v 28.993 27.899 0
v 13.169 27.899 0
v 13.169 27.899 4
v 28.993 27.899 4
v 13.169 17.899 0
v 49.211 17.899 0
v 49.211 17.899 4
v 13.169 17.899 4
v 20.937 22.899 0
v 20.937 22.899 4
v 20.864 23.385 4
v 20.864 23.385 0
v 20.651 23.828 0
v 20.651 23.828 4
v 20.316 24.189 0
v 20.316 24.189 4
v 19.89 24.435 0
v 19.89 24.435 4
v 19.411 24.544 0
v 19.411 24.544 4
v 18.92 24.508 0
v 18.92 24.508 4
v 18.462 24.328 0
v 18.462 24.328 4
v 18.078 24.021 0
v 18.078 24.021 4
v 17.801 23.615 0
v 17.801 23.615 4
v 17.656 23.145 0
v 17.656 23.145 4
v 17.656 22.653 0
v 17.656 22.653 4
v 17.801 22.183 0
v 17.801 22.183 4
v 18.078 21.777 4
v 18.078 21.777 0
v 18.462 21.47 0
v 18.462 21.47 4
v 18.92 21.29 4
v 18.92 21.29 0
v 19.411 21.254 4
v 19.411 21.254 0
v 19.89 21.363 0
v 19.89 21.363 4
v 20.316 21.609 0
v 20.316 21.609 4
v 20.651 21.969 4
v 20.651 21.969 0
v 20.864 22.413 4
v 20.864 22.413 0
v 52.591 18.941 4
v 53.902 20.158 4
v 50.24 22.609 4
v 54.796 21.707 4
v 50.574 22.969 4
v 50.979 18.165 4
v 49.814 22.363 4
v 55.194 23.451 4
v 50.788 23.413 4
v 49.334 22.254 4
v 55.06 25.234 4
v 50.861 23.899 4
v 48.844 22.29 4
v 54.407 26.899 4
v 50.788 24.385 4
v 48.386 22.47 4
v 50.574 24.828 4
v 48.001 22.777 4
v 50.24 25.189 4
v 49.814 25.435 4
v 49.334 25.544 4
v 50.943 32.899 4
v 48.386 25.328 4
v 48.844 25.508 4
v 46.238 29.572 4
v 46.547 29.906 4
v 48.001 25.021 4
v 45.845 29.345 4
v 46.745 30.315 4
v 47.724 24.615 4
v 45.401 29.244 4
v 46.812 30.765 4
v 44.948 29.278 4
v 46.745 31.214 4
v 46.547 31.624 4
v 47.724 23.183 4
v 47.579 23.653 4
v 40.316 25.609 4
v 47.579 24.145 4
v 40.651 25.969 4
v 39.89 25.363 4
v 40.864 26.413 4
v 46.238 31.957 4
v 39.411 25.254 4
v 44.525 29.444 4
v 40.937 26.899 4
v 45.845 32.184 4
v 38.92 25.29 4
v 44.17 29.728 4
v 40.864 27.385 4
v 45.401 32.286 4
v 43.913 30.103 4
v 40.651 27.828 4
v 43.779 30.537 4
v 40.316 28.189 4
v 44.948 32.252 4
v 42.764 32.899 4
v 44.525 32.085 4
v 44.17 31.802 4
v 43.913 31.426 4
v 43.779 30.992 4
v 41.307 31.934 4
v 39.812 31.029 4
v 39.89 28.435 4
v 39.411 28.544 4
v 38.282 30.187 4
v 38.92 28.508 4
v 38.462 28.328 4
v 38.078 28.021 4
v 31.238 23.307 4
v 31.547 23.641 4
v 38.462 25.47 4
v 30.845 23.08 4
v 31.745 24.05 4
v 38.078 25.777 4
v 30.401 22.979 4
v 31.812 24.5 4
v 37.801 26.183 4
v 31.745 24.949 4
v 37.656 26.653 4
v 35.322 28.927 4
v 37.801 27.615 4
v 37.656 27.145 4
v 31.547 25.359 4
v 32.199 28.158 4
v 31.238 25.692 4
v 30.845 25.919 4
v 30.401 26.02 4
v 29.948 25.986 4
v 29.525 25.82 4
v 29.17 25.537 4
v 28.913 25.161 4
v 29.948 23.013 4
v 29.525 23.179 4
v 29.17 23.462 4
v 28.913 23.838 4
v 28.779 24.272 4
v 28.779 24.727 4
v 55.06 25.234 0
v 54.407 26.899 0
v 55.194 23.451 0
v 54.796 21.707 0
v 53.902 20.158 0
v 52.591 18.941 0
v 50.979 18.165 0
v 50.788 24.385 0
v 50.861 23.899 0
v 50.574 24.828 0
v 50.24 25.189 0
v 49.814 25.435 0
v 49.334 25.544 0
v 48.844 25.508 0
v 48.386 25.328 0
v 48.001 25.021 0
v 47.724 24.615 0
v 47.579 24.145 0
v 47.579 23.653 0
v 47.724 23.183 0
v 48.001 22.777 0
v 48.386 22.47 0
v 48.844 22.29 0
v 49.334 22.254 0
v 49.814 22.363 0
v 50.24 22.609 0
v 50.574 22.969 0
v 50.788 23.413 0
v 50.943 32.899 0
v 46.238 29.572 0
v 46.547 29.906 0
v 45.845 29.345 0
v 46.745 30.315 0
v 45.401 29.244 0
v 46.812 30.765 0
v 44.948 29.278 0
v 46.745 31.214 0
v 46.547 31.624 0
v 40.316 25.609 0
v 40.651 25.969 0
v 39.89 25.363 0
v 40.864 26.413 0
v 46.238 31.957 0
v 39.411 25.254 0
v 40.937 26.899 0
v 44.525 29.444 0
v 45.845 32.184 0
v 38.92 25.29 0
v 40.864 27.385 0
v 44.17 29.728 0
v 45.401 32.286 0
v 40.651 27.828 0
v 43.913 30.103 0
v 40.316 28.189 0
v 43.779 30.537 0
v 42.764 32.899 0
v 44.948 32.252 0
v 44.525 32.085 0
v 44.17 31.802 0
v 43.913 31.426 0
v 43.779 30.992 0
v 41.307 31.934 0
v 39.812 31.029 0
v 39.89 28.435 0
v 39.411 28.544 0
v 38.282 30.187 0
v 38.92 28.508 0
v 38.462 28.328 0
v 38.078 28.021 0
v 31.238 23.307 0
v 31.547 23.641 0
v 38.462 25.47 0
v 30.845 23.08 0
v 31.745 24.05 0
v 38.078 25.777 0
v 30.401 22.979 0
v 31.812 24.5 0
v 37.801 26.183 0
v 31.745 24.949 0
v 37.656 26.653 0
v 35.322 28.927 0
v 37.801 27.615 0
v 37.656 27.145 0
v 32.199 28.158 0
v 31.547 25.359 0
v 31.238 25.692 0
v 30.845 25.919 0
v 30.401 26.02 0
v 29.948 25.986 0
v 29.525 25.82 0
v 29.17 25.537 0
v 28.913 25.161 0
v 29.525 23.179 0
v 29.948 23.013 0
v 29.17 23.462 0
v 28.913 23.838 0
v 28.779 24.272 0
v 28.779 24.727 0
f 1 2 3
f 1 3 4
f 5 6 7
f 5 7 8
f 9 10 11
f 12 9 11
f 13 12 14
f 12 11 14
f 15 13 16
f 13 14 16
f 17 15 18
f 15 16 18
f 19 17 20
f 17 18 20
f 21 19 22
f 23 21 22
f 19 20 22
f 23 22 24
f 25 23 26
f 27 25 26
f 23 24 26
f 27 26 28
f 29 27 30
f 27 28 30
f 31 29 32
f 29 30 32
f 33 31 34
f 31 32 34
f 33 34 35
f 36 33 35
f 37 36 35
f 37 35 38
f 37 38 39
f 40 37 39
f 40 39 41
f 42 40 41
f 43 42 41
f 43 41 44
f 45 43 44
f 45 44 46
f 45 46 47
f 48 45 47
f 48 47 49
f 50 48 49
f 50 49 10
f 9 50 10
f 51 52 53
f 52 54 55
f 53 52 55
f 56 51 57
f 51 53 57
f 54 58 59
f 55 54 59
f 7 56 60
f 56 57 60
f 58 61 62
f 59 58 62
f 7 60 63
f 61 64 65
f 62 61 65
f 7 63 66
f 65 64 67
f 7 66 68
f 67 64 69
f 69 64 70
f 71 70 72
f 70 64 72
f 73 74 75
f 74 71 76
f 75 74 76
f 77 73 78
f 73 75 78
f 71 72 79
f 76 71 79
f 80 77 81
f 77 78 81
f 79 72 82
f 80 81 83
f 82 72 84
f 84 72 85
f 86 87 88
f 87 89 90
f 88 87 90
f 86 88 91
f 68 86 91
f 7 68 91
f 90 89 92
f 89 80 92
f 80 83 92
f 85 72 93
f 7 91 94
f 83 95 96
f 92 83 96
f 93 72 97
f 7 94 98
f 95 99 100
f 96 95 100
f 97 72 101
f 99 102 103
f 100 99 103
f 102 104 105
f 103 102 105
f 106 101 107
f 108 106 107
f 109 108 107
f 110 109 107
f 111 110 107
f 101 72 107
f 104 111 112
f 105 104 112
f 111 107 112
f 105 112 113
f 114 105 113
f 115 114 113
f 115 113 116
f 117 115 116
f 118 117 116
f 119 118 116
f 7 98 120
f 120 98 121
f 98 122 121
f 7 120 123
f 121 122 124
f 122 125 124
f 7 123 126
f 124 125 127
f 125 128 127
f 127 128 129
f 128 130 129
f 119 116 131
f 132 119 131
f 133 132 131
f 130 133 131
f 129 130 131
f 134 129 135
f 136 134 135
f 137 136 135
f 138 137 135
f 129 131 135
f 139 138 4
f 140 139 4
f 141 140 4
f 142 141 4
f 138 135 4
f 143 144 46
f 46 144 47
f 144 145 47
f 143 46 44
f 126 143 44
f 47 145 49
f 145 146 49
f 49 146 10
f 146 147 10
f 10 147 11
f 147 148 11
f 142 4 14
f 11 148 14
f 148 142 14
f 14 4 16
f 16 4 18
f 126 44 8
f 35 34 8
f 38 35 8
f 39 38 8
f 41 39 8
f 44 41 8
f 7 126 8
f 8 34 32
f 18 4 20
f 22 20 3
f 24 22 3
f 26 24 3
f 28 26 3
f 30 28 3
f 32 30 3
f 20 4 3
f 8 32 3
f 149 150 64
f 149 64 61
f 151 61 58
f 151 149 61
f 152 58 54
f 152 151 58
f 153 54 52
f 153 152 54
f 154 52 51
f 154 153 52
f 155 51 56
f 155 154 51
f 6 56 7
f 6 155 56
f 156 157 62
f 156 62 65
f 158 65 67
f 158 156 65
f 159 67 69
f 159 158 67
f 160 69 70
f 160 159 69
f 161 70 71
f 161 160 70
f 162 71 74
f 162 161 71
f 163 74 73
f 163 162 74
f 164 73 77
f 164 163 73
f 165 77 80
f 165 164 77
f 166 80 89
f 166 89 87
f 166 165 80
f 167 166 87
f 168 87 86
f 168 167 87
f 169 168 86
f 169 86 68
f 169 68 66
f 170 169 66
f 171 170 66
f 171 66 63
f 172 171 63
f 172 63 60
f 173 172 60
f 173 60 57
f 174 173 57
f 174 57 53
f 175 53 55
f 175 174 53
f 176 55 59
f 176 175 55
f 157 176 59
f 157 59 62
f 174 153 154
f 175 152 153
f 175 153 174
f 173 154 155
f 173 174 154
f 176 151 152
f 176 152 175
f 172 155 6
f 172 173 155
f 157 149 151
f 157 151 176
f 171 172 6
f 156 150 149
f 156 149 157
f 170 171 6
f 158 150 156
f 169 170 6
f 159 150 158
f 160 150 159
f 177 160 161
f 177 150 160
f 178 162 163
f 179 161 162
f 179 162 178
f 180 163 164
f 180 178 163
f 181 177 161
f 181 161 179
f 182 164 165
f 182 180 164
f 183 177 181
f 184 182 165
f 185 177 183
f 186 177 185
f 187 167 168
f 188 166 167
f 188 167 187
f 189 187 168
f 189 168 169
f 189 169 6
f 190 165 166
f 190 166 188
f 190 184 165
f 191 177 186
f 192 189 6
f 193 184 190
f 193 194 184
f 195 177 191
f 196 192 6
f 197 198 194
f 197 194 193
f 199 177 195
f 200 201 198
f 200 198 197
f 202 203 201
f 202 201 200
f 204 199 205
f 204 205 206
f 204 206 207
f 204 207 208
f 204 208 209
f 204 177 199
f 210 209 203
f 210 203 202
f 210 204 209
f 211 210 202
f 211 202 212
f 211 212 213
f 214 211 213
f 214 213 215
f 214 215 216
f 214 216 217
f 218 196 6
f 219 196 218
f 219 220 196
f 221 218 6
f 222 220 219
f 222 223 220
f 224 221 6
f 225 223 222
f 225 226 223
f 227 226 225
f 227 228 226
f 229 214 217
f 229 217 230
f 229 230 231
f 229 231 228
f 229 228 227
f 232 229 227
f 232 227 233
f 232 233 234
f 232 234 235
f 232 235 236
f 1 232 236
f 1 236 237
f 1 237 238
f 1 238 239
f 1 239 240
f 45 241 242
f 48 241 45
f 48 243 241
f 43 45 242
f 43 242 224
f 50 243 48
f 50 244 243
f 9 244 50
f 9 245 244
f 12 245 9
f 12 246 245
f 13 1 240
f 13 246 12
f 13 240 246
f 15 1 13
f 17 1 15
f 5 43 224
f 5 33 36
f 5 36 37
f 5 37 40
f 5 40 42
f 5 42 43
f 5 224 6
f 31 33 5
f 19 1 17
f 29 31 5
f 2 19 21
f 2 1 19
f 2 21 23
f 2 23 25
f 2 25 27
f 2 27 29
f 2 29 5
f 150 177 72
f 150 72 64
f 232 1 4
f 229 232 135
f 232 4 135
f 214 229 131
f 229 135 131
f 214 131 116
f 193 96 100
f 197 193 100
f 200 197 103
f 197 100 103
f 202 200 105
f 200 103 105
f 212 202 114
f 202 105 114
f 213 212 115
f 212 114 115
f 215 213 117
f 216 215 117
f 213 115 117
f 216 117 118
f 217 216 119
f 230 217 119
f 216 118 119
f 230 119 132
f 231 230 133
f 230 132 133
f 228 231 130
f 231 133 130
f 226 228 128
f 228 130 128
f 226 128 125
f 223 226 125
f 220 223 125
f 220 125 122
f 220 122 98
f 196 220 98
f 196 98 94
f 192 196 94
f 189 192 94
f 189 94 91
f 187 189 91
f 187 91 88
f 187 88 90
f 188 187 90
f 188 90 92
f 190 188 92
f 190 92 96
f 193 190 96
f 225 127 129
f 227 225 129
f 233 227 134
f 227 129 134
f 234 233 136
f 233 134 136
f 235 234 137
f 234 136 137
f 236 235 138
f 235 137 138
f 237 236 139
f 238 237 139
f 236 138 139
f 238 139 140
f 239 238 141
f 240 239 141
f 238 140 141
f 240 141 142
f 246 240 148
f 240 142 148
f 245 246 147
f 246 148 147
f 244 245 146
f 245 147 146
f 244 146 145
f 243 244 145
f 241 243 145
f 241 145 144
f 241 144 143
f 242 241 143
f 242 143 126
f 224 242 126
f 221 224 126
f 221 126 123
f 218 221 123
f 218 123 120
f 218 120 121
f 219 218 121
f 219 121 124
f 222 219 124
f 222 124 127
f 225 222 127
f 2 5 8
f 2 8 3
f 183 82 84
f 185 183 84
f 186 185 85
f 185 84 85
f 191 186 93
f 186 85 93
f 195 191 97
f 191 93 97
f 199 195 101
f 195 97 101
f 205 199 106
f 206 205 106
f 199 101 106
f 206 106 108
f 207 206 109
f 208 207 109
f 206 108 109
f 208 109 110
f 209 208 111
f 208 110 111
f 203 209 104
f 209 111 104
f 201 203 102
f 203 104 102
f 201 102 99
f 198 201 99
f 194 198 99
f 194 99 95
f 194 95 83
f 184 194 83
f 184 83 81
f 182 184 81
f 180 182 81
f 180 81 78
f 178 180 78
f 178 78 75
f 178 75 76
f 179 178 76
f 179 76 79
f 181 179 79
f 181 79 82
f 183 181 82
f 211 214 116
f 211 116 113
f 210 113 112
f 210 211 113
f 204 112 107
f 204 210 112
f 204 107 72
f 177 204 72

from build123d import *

# Parameters (mm, degrees)
SKETCH_1_R          = 1.65
EXTRUDE_1_DEPTH     = 4
SKETCH_2_W          = 37.773502691
SKETCH_2_H          = 11.965737329
CUT_EXTRUDE_1_DEPTH = 10
SKETCH_4_R          = 1.65
CUT_EXTRUDE_3_DEPTH = 10
CUT_EXTRUDE_2_DEPTH = 10
FILLET_1_R          = 20
SKETCH_5_R          = 1.525
CUT_EXTRUDE_4_DEPTH = 12


with BuildPart() as part:
    # 草图1 → 凸台-拉伸1 (new body)
    with BuildSketch(Plane.XY):
        with BuildLine():
            Line((13.169415516, 42.898917412), (45.169415516, 42.898917412))
            Line((45.169415516, 42.898917412), (54.407019823, 26.898917412))
            ThreePointArc((54.407019823, 26.898917412), (54.407019823, 20.898917412), (49.2108674, 17.898917412))
            Line((49.2108674, 17.898917412), (25.169415516, 17.898917412))
            Line((25.169415516, 17.898917412), (13.169415516, 17.898917412))
            Line((13.169415516, 17.898917412), (13.169415516, 42.898917412))
        make_face()
        with Locations((49.2108674, 23.898917412)):
            Circle(SKETCH_1_R, mode=Mode.SUBTRACT)
    extrude(amount=EXTRUDE_1_DEPTH)

    # 草图2 → 切除-拉伸1 (cut)
    with BuildSketch(Plane.XY.offset(4)):
        with Locations((32.056166862, 38.881786077)):
            Rectangle(SKETCH_2_W, SKETCH_2_H)
    extrude(amount=-CUT_EXTRUDE_1_DEPTH, mode=Mode.SUBTRACT)

    # 草图4 → 切除-拉伸3 (cut)
    with BuildSketch(Plane.XY.offset(4)):
        with Locations((19.287444113, 22.898917412)):
            Circle(SKETCH_4_R)
        with Locations((39.287444113, 26.898917412)):
            Circle(SKETCH_4_R)
    extrude(amount=-CUT_EXTRUDE_3_DEPTH, mode=Mode.SUBTRACT)

    # 草图3 → 切除-拉伸2 (cut)
    with BuildSketch(Plane(origin=(0, 0, 0), x_dir=(-1, 0, 0), z_dir=(0, 0, -1))):
        with BuildLine():
            Line((-13.169415516, 27.898917412), (-33.118062206, 27.898917412))
            ThreePointArc((-33.118062206, 27.898917412), (-38.100309763, 30.092049708), (-42.764440301, 32.898917412))
            Line((-42.764440301, 32.898917412), (-13.169415516, 32.898917412))
            Line((-13.169415516, 32.898917412), (-13.169415516, 27.898917412))
        make_face()
    extrude(amount=-CUT_EXTRUDE_2_DEPTH, mode=Mode.SUBTRACT)

    # 圆角1
    fillet_1_edges = [part.edges().sort_by_distance(p)[0] for p in [
        (33.118062206, 27.898917412, 2),
    ]]
    fillet(fillet_1_edges, radius=FILLET_1_R)

    # 草图5 → 切除-拉伸4 (cut)
    with BuildSketch(Plane.XY.offset(4)):
        with Locations((30.287444113, 24.499597572)):
            Circle(SKETCH_5_R)
        with Locations((45.287444113, 30.764768776)):
            Circle(SKETCH_5_R)
    extrude(amount=-CUT_EXTRUDE_4_DEPTH, mode=Mode.SUBTRACT)


solid = part.part
